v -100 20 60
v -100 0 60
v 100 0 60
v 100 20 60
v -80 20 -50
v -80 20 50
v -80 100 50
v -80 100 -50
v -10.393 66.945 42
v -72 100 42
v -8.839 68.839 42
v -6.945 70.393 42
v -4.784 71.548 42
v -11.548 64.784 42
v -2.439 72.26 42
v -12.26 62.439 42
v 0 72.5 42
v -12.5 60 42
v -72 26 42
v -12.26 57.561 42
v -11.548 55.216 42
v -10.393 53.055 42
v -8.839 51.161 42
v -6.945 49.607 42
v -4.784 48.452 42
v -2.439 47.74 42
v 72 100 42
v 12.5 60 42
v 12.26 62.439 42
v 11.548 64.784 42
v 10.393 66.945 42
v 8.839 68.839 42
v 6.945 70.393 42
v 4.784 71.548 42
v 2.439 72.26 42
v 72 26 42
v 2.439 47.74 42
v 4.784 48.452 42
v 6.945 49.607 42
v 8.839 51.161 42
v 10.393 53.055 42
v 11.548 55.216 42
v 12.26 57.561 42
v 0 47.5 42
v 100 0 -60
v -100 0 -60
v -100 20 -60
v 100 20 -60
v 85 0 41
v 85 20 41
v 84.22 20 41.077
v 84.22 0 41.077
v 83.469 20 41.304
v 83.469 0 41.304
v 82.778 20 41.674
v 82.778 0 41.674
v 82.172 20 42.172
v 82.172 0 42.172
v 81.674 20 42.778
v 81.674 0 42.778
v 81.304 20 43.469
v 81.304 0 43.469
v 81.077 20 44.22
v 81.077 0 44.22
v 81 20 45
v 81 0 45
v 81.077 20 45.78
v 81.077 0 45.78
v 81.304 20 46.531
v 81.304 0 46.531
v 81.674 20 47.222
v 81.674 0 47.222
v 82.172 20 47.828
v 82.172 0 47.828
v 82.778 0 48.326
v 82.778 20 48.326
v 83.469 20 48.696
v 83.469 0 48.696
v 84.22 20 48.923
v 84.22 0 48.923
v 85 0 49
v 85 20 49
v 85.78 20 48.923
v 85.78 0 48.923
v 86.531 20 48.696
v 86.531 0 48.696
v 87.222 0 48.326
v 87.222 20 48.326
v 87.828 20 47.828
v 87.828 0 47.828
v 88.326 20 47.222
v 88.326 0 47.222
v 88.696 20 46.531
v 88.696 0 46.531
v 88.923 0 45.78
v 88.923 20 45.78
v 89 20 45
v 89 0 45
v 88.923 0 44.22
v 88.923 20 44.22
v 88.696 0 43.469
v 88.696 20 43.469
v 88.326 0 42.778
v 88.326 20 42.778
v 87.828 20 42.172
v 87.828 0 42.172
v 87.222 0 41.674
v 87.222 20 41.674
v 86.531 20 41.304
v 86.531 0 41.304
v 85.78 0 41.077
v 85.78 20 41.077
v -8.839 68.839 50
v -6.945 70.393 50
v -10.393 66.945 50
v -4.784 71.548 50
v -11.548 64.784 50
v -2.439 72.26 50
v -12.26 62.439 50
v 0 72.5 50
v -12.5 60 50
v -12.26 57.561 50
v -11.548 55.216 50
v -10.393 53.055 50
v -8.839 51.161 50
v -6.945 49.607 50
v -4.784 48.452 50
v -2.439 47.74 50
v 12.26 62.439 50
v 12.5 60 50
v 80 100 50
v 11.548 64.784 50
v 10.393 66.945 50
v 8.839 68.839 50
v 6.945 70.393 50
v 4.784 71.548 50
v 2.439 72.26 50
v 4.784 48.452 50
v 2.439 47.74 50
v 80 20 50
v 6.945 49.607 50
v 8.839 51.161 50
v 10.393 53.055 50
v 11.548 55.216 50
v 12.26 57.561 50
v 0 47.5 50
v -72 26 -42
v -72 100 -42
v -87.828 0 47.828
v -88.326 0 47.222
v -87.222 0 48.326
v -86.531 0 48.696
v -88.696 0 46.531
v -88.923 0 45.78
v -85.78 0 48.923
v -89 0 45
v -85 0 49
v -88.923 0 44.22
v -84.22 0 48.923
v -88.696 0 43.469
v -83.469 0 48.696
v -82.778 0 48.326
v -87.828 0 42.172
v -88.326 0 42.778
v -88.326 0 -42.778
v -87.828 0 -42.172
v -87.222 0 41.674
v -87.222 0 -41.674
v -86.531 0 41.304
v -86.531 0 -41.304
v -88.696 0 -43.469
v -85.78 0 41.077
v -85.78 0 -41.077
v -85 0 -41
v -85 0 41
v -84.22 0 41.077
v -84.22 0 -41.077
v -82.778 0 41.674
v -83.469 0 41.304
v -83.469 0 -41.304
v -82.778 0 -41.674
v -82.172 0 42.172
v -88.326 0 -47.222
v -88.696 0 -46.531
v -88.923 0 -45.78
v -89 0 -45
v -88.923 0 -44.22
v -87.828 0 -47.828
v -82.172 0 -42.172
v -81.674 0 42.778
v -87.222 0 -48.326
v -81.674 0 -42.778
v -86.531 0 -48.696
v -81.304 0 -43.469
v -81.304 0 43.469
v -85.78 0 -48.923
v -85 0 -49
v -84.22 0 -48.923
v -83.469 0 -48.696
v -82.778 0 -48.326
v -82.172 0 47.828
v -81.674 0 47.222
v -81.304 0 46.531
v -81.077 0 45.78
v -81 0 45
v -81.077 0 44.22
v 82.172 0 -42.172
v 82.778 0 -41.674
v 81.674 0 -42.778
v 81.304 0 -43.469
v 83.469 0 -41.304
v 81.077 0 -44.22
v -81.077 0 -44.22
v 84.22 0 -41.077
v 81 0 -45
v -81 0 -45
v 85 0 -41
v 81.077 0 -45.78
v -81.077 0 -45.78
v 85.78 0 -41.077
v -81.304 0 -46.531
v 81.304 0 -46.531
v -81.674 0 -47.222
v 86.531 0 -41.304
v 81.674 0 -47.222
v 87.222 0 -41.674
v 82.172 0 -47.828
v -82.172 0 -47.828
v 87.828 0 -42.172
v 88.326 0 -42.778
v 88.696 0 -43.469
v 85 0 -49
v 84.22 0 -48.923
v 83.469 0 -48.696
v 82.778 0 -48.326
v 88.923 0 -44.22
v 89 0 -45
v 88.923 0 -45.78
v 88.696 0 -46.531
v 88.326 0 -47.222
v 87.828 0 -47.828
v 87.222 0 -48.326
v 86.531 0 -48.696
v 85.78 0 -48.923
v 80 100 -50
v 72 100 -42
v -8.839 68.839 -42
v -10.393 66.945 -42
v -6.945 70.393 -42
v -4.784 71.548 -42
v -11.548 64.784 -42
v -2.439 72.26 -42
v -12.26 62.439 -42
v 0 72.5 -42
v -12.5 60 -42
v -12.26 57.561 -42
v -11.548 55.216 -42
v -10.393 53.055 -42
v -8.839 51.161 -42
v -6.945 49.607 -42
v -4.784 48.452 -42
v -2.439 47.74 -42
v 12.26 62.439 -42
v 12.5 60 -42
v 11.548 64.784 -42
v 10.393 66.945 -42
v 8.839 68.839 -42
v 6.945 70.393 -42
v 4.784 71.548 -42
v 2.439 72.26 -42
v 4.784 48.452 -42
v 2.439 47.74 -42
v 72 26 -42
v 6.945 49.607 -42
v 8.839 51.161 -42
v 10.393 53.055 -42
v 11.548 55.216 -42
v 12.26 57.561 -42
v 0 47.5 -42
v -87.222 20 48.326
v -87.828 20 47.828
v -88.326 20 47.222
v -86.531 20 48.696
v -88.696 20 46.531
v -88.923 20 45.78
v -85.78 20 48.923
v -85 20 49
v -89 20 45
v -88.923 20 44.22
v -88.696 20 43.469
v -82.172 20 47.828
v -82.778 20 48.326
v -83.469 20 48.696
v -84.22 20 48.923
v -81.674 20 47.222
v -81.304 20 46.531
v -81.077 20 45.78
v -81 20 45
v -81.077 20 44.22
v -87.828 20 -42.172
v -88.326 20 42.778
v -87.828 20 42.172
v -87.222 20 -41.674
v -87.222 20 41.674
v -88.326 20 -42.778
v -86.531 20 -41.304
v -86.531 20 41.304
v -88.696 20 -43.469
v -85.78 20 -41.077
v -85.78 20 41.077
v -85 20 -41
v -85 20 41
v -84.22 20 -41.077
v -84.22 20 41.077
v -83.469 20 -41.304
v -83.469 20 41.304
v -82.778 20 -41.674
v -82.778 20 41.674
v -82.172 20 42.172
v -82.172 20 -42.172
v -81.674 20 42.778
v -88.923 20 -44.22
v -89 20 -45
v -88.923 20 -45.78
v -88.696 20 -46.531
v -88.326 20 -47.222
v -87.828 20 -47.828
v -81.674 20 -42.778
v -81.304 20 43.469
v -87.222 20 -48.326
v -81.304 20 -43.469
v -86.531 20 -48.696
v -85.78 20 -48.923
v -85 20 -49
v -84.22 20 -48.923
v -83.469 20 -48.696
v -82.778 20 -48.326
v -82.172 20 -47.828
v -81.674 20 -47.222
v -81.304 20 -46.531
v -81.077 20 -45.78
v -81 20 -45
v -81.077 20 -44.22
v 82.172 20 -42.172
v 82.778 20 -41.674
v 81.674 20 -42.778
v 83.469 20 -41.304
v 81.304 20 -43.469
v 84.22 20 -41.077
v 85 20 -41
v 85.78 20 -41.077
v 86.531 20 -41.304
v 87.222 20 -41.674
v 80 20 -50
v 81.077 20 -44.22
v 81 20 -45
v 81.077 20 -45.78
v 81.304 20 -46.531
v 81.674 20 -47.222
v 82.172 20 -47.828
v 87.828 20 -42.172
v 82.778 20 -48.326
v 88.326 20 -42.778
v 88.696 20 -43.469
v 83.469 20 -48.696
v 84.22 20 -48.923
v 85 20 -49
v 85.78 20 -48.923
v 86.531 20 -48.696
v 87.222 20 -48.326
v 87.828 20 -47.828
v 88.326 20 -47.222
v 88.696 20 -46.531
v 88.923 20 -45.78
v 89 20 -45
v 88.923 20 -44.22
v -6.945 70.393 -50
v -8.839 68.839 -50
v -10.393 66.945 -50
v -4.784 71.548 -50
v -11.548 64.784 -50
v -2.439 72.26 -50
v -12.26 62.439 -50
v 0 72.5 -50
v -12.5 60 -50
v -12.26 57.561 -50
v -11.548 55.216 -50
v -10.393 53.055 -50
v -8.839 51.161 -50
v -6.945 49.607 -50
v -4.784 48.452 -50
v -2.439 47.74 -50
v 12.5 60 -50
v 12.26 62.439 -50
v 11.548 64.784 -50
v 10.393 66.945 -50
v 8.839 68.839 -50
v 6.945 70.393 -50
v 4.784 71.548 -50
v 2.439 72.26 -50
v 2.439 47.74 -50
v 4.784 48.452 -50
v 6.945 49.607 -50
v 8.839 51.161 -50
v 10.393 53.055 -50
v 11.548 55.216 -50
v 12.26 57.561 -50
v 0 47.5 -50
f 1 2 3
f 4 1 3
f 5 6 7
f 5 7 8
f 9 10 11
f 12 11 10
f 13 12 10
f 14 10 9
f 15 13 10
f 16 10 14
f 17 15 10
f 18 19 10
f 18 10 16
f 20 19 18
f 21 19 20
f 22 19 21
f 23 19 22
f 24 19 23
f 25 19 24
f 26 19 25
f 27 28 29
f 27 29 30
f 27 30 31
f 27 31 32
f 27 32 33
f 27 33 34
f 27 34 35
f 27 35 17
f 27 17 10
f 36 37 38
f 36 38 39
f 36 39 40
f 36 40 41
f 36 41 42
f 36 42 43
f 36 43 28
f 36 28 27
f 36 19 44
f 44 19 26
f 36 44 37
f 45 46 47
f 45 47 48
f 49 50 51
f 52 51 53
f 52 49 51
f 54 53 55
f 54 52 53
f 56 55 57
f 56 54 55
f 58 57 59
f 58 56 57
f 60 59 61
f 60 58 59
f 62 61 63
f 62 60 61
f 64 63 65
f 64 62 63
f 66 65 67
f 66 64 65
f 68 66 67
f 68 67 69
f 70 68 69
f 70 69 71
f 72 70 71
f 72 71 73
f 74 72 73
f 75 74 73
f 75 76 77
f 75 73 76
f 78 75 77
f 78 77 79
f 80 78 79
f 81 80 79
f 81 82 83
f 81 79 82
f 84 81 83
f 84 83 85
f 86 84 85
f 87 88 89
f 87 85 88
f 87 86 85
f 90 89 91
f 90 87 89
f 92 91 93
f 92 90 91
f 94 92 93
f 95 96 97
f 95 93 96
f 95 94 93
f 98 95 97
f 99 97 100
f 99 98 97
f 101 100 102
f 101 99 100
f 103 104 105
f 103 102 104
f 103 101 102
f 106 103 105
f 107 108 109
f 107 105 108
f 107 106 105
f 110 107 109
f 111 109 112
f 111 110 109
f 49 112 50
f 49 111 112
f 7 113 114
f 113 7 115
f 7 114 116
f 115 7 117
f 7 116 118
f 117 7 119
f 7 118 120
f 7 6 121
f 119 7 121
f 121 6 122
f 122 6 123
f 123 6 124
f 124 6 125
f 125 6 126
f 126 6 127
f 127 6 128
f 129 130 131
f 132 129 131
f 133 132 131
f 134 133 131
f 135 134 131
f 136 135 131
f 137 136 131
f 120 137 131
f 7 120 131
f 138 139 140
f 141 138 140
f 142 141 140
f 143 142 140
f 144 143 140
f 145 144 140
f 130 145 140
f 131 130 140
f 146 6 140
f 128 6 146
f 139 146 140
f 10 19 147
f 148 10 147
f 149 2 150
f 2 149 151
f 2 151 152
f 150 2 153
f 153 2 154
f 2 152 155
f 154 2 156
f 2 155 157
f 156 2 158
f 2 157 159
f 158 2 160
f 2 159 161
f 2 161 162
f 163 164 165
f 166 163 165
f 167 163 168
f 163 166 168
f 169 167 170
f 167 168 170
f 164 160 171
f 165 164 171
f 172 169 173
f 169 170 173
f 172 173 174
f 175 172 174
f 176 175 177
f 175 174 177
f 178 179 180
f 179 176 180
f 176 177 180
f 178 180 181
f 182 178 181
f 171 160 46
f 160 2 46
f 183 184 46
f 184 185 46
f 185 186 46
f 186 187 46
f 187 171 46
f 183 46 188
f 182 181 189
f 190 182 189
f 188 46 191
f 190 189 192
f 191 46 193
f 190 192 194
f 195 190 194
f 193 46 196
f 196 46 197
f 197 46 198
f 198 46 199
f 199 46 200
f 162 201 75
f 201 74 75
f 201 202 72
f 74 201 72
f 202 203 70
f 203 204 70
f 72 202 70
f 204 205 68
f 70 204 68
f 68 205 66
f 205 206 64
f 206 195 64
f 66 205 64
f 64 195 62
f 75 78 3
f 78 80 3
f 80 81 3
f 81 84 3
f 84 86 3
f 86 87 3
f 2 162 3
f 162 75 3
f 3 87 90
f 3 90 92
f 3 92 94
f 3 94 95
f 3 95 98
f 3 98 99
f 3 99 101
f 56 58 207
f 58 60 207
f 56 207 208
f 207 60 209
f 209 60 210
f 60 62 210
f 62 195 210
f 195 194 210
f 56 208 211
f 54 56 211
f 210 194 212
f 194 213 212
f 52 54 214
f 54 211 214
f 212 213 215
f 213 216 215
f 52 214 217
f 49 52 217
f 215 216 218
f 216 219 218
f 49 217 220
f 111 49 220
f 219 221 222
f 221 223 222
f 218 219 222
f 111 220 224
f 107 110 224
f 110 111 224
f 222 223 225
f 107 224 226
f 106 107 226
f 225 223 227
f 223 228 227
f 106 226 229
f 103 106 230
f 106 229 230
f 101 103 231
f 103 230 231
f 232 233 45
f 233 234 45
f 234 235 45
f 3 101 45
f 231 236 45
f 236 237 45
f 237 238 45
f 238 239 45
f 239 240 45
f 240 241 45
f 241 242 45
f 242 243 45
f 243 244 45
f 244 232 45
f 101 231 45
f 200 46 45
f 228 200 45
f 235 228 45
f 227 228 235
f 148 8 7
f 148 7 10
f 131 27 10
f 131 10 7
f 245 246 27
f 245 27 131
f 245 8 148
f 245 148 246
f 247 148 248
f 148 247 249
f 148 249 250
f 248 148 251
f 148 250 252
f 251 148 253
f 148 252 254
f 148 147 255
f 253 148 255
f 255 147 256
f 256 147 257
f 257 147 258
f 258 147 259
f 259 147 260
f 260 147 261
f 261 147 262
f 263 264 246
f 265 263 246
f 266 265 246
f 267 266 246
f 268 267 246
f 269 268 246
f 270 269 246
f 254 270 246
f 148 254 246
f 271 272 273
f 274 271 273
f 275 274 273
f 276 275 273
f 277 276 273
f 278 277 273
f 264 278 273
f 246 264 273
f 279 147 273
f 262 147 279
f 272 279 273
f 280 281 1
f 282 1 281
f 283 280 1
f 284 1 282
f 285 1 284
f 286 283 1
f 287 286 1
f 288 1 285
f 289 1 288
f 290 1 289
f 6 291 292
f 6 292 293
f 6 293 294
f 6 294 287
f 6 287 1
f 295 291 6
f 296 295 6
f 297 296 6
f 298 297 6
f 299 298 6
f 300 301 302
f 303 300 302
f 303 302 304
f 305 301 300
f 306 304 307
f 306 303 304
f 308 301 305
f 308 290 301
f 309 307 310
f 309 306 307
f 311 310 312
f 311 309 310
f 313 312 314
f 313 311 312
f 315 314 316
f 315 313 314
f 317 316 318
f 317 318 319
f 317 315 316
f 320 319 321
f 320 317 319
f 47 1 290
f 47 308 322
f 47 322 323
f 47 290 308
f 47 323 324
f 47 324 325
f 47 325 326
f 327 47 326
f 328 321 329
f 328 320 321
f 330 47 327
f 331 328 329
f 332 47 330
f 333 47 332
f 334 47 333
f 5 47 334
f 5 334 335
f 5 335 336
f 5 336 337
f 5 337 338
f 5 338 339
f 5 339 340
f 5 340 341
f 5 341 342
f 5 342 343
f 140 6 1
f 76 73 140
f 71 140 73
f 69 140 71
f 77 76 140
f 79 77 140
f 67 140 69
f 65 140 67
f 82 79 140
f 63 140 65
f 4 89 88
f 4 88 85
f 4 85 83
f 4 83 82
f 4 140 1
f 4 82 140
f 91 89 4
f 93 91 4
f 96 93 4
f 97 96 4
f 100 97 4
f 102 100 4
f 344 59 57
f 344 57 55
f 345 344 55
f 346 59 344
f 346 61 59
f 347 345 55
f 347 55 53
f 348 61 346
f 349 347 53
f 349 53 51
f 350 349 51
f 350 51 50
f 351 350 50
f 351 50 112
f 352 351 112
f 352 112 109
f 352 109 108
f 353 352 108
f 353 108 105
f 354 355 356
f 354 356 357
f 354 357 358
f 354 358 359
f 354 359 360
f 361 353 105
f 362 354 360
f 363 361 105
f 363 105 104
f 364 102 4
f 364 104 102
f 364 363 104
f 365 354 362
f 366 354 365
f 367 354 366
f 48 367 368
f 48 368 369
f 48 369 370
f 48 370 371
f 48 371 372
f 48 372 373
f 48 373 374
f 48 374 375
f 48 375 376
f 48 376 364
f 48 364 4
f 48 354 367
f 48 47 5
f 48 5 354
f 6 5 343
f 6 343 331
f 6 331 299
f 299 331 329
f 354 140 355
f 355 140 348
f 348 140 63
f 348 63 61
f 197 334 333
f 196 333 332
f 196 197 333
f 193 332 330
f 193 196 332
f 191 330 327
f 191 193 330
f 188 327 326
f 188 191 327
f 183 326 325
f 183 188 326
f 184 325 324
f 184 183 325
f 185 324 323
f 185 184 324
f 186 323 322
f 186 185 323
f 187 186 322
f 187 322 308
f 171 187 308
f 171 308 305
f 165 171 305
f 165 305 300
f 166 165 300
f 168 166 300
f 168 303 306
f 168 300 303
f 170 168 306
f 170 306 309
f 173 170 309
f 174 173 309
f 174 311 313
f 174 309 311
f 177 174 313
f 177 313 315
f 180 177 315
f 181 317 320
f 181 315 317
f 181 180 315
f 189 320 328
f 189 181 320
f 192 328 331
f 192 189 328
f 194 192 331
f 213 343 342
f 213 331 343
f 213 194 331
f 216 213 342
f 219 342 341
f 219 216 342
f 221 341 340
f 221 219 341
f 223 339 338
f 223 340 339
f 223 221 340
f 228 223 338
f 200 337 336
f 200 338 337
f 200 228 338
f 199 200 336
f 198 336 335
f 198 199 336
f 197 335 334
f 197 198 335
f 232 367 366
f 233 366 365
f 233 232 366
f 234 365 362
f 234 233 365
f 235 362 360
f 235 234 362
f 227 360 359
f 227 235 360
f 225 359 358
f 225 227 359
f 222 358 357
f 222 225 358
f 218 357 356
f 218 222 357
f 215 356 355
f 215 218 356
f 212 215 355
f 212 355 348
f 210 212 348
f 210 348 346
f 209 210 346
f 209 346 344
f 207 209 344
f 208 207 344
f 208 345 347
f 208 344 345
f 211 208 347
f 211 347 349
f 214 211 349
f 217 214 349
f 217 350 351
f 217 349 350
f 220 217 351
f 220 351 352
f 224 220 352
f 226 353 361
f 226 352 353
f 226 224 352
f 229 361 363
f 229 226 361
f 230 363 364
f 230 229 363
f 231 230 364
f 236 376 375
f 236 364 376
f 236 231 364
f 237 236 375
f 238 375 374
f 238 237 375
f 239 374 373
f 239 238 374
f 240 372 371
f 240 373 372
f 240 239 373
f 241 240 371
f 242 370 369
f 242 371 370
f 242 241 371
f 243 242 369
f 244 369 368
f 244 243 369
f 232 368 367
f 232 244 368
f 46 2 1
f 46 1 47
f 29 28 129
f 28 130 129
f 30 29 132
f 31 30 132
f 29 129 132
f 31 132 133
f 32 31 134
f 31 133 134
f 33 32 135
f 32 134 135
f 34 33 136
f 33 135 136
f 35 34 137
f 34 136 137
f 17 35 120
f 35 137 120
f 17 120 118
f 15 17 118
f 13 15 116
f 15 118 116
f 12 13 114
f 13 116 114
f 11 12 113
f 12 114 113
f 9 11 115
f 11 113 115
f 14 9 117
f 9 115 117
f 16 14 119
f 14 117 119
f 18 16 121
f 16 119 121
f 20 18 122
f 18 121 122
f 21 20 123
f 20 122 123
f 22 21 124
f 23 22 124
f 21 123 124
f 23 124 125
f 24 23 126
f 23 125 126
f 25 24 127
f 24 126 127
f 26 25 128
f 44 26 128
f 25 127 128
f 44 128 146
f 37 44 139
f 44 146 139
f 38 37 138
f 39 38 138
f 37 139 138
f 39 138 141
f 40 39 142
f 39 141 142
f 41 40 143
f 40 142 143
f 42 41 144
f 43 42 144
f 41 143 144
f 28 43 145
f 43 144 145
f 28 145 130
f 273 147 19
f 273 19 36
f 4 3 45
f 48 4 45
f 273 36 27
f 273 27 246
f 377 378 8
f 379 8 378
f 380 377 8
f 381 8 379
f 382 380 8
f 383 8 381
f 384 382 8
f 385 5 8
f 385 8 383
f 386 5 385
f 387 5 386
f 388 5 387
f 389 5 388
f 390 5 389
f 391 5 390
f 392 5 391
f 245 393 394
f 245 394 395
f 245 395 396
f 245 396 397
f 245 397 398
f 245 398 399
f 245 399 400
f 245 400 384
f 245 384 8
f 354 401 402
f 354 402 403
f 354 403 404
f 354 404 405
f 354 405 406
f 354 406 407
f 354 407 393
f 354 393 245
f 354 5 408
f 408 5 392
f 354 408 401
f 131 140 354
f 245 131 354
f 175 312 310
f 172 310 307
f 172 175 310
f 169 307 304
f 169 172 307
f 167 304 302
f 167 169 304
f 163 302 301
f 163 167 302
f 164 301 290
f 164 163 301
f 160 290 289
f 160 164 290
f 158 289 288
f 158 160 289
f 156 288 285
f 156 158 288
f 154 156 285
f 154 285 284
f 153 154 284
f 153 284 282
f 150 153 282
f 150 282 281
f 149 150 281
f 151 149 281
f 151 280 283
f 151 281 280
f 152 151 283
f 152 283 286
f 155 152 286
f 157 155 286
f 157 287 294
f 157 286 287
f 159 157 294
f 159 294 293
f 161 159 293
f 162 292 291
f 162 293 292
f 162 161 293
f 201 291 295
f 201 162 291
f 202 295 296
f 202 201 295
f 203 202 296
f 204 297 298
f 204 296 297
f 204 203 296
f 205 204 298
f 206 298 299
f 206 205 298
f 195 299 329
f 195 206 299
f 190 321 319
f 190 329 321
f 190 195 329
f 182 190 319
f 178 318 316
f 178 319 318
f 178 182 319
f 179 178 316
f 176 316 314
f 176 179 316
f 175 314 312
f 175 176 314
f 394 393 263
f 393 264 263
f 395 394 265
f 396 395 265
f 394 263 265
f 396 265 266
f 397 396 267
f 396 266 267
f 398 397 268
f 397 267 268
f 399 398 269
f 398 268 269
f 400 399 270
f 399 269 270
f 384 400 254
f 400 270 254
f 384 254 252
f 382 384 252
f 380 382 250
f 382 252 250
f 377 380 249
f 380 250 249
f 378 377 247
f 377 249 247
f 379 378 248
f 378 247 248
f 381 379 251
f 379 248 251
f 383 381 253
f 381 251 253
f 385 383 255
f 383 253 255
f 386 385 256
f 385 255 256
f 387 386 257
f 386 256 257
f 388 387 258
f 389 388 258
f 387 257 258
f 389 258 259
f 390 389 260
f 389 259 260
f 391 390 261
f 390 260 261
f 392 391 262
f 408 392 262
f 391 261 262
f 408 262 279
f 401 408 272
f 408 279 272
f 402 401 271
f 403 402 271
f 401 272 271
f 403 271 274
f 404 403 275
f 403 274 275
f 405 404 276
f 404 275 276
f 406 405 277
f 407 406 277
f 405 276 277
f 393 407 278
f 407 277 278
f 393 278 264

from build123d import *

# Parameters (mm, degrees)
SKETCH_1_W          = 200
SKETCH_1_H          = 120
EXTRUDE_1_DEPTH     = 20
SKETCH_2_W          = 160
SKETCH_2_H          = 100
EXTRUDE_2_DEPTH     = 80
SKETCH_3_W          = 144
SKETCH_3_H          = 84
CUT_EXTRUDE_1_DEPTH = 139.115893365
SKETCH_4_R          = 4
CUT_EXTRUDE_2_DEPTH = 154.622914957
SKETCH_5_R          = 12.5
CUT_EXTRUDE_3_DEPTH = 201


with BuildPart() as part:
    # 草图1 → 凸台-拉伸1 (new body)
    with BuildSketch(Plane(origin=(0, 0, 0), x_dir=(1, 0, 0), z_dir=(0, 1, 0))):
        Rectangle(SKETCH_1_W, SKETCH_1_H)
    extrude(amount=EXTRUDE_1_DEPTH)

    # 草图2 → 凸台-拉伸2 (add)
    with BuildSketch(Plane(origin=(0, 20, 0), x_dir=(1, 0, 0), z_dir=(0, 1, 0))):
        Rectangle(SKETCH_2_W, SKETCH_2_H)
    extrude(amount=EXTRUDE_2_DEPTH)

    # 草图3 → 切除-拉伸1 (cut, through all)
    with BuildSketch(Plane(origin=(0, 26, 0), x_dir=(1, 0, 0), z_dir=(0, 1, 0))):
        Rectangle(SKETCH_3_W, SKETCH_3_H)
    extrude(amount=CUT_EXTRUDE_1_DEPTH, mode=Mode.SUBTRACT)

    # 草图4 → 切除-拉伸2 (cut, through all)
    with BuildSketch(Plane(origin=(0, 0, 0), x_dir=(1, 0, 0), z_dir=(0, 1, 0))):
        with Locations(Location((85, -45, 0), (0, 0, 90))):
            Circle(SKETCH_4_R)
        with Locations(Location((85, 45, 0), (0, 0, 90))):
            Circle(SKETCH_4_R)
        with Locations(Location((-85, -45, 0), (0, 0, 90))):
            Circle(SKETCH_4_R)
        with Locations(Location((-85, 45, 0), (0, 0, 90))):
            Circle(SKETCH_4_R)
    extrude(amount=CUT_EXTRUDE_2_DEPTH, mode=Mode.SUBTRACT)

    # 草图5 → 切除-拉伸3 (cut, symmetric)
    with BuildSketch(Plane.XY):
        with Locations((0, 60)):
            Circle(SKETCH_5_R)
    extrude(amount=CUT_EXTRUDE_3_DEPTH, both=True, mode=Mode.SUBTRACT)


solid = part.part
